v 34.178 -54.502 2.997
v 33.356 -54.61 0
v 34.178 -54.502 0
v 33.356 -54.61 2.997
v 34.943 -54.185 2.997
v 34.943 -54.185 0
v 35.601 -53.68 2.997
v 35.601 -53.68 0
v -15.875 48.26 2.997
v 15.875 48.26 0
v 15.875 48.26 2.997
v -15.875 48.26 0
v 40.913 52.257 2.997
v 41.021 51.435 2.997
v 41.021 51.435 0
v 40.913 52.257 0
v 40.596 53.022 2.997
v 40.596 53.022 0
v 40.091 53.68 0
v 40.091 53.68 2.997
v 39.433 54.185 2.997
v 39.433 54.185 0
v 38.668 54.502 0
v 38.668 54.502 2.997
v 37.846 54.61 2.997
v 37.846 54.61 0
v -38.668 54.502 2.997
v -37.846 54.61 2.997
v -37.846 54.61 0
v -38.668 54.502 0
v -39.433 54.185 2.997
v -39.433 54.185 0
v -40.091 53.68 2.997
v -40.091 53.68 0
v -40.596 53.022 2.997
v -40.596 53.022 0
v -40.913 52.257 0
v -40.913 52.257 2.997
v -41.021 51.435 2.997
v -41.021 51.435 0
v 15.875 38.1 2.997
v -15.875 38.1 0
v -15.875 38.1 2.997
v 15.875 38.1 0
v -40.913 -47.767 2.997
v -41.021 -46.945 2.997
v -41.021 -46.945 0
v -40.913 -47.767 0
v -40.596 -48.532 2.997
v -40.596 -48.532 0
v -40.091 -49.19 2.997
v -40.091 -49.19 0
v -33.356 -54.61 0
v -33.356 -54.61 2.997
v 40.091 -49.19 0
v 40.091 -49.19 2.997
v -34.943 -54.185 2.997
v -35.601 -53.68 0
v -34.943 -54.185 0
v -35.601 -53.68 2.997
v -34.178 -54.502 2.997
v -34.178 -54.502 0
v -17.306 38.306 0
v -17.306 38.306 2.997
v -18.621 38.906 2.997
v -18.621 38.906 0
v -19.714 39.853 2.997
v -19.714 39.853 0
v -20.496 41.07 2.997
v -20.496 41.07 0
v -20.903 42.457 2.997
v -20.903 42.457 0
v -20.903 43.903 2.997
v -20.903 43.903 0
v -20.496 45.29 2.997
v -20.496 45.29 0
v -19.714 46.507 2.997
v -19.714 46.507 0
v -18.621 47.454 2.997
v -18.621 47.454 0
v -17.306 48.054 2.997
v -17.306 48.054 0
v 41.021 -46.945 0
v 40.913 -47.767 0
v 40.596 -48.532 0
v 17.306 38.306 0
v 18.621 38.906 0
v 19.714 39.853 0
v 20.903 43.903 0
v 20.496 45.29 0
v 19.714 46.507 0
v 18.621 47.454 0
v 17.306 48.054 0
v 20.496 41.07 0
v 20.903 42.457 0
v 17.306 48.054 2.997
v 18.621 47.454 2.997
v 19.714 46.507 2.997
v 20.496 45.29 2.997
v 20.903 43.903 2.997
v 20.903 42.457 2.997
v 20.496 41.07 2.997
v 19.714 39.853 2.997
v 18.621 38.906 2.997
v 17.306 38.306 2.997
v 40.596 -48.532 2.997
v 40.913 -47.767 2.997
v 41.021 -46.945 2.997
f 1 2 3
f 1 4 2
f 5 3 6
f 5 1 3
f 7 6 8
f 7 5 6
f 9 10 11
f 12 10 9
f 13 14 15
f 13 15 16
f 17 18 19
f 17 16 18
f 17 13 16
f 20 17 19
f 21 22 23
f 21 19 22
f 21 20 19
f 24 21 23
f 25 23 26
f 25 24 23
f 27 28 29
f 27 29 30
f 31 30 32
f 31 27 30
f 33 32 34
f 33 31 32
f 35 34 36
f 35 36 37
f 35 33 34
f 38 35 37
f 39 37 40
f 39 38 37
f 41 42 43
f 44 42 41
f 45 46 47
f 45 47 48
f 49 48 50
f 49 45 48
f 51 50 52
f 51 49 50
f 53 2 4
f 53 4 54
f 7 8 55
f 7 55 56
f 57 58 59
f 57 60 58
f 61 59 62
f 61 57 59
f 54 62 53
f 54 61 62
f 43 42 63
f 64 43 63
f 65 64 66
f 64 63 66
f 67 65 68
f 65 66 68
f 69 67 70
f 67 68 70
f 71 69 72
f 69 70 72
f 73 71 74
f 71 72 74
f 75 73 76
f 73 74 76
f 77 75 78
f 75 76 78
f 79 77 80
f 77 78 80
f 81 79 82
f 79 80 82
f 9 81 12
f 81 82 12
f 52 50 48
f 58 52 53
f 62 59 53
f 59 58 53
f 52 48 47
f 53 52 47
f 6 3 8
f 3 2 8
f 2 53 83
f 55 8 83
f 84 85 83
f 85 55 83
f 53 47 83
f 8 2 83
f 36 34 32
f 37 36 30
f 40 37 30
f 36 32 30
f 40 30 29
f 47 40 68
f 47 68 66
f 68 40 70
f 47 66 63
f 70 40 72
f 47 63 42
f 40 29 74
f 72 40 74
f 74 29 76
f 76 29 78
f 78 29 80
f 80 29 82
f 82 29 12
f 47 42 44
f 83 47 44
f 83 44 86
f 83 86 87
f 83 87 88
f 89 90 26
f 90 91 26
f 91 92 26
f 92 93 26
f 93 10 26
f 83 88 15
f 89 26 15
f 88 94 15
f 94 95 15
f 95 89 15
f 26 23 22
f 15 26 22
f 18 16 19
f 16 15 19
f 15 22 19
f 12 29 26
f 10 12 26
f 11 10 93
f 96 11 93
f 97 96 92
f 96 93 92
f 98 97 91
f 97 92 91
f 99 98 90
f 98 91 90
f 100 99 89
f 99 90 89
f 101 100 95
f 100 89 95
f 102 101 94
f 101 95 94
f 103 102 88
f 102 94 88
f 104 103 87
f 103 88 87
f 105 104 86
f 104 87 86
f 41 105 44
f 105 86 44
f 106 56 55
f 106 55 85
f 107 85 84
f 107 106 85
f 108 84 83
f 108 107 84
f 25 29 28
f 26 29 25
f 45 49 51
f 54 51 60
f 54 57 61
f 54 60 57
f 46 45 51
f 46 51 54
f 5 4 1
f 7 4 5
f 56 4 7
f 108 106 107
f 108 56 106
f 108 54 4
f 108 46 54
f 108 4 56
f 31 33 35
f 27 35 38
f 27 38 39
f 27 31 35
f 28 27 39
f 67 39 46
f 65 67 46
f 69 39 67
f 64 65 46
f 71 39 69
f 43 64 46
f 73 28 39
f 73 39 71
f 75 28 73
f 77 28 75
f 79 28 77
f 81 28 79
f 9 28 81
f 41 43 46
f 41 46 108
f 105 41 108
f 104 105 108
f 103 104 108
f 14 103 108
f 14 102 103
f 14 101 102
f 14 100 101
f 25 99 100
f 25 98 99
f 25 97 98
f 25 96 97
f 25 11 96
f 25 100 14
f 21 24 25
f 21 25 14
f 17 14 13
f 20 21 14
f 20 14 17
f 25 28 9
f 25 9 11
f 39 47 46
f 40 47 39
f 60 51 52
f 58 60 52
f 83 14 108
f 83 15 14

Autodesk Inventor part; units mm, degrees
ref_plane "YZ Plane" through (0, 0, 0) normal (1, 0, 0) x (0, 1, 0)
ref_plane "XZ Plane" through (0, 0, 0) normal (0, 1, 0) x (-1, 0, 0)
ref_plane "XY Plane" through (0, 0, 0) normal (0, 0, 1) x (1, 0, 0)
sketch "Sketch1" plane through (0, 0, 0) normal (0, 0, 1) x (1, 0, 0)
  line L0 (0, 76.454) -> (0, -76.454) projected
  line L1 (-57.4294, 0) -> (57.4294, 0) projected
  line L2 (41.021, -54.61) -> (-41.021, -54.61)
  line L3 (-41.021, -54.61) -> (-41.021, 54.61)
  line L4 (-41.021, 54.61) -> (41.021, 54.61)
  line L5 (41.021, 54.61) -> (41.021, -54.61)
  line L6 (41.021, -54.61) -> (-41.021, 54.61) construction
  line L7 (-41.021, -54.61) -> (41.021, 54.61) construction
  line L8 (15.875, 43.18) -> (-15.875, 43.18) construction
  line L9 (15.875, 48.26) -> (-15.875, 48.26)
  line L10 (-15.875, 38.1) -> (15.875, 38.1)
  arc A0 (15.875, 38.1) -> (15.875, 48.26) centre (15.875, 43.18) ccw
  arc A1 (-15.875, 48.26) -> (-15.875, 38.1) centre (-15.875, 43.18) ccw
  point P0 (0, 0)
  point P1 (0, 43.18)
  dimension "d0" = 82.042
  dimension "d1" = 109.22
  dimension "d4" = 31.75
  dimension "d5" = 6.35
  dimension "d6" = 5.08
extrude "Extrusion1" add sketch "Sketch1" along normal blind 2.9972 contours L4 L5 L1 L0 L10 A0 L9 | L0 L9 A1 L10 L1 L3 L4 | L1 L0 L2 L3 | L5 L2 L0 L1
fillet "Fillet1" radius 3.175 2 edges at (-41.021, 54.61, 1.4986) (41.021, 54.61, 1.4986)
chamfer "Chamfer1" distance 6.35 angle 45 2 edges at (41.021, -54.61, 1.4986) (-41.021, -54.61, 1.4986)
fillet "Fillet2" radius 3.175 4 edges at (-41.021, -48.26, 1.4986) (-34.671, -54.61, 1.4986) (34.671, -54.61, 1.4986) (41.021, -48.26, 1.4986)
properties part number "J010355" material "ACRYLIC, CLEAR"
